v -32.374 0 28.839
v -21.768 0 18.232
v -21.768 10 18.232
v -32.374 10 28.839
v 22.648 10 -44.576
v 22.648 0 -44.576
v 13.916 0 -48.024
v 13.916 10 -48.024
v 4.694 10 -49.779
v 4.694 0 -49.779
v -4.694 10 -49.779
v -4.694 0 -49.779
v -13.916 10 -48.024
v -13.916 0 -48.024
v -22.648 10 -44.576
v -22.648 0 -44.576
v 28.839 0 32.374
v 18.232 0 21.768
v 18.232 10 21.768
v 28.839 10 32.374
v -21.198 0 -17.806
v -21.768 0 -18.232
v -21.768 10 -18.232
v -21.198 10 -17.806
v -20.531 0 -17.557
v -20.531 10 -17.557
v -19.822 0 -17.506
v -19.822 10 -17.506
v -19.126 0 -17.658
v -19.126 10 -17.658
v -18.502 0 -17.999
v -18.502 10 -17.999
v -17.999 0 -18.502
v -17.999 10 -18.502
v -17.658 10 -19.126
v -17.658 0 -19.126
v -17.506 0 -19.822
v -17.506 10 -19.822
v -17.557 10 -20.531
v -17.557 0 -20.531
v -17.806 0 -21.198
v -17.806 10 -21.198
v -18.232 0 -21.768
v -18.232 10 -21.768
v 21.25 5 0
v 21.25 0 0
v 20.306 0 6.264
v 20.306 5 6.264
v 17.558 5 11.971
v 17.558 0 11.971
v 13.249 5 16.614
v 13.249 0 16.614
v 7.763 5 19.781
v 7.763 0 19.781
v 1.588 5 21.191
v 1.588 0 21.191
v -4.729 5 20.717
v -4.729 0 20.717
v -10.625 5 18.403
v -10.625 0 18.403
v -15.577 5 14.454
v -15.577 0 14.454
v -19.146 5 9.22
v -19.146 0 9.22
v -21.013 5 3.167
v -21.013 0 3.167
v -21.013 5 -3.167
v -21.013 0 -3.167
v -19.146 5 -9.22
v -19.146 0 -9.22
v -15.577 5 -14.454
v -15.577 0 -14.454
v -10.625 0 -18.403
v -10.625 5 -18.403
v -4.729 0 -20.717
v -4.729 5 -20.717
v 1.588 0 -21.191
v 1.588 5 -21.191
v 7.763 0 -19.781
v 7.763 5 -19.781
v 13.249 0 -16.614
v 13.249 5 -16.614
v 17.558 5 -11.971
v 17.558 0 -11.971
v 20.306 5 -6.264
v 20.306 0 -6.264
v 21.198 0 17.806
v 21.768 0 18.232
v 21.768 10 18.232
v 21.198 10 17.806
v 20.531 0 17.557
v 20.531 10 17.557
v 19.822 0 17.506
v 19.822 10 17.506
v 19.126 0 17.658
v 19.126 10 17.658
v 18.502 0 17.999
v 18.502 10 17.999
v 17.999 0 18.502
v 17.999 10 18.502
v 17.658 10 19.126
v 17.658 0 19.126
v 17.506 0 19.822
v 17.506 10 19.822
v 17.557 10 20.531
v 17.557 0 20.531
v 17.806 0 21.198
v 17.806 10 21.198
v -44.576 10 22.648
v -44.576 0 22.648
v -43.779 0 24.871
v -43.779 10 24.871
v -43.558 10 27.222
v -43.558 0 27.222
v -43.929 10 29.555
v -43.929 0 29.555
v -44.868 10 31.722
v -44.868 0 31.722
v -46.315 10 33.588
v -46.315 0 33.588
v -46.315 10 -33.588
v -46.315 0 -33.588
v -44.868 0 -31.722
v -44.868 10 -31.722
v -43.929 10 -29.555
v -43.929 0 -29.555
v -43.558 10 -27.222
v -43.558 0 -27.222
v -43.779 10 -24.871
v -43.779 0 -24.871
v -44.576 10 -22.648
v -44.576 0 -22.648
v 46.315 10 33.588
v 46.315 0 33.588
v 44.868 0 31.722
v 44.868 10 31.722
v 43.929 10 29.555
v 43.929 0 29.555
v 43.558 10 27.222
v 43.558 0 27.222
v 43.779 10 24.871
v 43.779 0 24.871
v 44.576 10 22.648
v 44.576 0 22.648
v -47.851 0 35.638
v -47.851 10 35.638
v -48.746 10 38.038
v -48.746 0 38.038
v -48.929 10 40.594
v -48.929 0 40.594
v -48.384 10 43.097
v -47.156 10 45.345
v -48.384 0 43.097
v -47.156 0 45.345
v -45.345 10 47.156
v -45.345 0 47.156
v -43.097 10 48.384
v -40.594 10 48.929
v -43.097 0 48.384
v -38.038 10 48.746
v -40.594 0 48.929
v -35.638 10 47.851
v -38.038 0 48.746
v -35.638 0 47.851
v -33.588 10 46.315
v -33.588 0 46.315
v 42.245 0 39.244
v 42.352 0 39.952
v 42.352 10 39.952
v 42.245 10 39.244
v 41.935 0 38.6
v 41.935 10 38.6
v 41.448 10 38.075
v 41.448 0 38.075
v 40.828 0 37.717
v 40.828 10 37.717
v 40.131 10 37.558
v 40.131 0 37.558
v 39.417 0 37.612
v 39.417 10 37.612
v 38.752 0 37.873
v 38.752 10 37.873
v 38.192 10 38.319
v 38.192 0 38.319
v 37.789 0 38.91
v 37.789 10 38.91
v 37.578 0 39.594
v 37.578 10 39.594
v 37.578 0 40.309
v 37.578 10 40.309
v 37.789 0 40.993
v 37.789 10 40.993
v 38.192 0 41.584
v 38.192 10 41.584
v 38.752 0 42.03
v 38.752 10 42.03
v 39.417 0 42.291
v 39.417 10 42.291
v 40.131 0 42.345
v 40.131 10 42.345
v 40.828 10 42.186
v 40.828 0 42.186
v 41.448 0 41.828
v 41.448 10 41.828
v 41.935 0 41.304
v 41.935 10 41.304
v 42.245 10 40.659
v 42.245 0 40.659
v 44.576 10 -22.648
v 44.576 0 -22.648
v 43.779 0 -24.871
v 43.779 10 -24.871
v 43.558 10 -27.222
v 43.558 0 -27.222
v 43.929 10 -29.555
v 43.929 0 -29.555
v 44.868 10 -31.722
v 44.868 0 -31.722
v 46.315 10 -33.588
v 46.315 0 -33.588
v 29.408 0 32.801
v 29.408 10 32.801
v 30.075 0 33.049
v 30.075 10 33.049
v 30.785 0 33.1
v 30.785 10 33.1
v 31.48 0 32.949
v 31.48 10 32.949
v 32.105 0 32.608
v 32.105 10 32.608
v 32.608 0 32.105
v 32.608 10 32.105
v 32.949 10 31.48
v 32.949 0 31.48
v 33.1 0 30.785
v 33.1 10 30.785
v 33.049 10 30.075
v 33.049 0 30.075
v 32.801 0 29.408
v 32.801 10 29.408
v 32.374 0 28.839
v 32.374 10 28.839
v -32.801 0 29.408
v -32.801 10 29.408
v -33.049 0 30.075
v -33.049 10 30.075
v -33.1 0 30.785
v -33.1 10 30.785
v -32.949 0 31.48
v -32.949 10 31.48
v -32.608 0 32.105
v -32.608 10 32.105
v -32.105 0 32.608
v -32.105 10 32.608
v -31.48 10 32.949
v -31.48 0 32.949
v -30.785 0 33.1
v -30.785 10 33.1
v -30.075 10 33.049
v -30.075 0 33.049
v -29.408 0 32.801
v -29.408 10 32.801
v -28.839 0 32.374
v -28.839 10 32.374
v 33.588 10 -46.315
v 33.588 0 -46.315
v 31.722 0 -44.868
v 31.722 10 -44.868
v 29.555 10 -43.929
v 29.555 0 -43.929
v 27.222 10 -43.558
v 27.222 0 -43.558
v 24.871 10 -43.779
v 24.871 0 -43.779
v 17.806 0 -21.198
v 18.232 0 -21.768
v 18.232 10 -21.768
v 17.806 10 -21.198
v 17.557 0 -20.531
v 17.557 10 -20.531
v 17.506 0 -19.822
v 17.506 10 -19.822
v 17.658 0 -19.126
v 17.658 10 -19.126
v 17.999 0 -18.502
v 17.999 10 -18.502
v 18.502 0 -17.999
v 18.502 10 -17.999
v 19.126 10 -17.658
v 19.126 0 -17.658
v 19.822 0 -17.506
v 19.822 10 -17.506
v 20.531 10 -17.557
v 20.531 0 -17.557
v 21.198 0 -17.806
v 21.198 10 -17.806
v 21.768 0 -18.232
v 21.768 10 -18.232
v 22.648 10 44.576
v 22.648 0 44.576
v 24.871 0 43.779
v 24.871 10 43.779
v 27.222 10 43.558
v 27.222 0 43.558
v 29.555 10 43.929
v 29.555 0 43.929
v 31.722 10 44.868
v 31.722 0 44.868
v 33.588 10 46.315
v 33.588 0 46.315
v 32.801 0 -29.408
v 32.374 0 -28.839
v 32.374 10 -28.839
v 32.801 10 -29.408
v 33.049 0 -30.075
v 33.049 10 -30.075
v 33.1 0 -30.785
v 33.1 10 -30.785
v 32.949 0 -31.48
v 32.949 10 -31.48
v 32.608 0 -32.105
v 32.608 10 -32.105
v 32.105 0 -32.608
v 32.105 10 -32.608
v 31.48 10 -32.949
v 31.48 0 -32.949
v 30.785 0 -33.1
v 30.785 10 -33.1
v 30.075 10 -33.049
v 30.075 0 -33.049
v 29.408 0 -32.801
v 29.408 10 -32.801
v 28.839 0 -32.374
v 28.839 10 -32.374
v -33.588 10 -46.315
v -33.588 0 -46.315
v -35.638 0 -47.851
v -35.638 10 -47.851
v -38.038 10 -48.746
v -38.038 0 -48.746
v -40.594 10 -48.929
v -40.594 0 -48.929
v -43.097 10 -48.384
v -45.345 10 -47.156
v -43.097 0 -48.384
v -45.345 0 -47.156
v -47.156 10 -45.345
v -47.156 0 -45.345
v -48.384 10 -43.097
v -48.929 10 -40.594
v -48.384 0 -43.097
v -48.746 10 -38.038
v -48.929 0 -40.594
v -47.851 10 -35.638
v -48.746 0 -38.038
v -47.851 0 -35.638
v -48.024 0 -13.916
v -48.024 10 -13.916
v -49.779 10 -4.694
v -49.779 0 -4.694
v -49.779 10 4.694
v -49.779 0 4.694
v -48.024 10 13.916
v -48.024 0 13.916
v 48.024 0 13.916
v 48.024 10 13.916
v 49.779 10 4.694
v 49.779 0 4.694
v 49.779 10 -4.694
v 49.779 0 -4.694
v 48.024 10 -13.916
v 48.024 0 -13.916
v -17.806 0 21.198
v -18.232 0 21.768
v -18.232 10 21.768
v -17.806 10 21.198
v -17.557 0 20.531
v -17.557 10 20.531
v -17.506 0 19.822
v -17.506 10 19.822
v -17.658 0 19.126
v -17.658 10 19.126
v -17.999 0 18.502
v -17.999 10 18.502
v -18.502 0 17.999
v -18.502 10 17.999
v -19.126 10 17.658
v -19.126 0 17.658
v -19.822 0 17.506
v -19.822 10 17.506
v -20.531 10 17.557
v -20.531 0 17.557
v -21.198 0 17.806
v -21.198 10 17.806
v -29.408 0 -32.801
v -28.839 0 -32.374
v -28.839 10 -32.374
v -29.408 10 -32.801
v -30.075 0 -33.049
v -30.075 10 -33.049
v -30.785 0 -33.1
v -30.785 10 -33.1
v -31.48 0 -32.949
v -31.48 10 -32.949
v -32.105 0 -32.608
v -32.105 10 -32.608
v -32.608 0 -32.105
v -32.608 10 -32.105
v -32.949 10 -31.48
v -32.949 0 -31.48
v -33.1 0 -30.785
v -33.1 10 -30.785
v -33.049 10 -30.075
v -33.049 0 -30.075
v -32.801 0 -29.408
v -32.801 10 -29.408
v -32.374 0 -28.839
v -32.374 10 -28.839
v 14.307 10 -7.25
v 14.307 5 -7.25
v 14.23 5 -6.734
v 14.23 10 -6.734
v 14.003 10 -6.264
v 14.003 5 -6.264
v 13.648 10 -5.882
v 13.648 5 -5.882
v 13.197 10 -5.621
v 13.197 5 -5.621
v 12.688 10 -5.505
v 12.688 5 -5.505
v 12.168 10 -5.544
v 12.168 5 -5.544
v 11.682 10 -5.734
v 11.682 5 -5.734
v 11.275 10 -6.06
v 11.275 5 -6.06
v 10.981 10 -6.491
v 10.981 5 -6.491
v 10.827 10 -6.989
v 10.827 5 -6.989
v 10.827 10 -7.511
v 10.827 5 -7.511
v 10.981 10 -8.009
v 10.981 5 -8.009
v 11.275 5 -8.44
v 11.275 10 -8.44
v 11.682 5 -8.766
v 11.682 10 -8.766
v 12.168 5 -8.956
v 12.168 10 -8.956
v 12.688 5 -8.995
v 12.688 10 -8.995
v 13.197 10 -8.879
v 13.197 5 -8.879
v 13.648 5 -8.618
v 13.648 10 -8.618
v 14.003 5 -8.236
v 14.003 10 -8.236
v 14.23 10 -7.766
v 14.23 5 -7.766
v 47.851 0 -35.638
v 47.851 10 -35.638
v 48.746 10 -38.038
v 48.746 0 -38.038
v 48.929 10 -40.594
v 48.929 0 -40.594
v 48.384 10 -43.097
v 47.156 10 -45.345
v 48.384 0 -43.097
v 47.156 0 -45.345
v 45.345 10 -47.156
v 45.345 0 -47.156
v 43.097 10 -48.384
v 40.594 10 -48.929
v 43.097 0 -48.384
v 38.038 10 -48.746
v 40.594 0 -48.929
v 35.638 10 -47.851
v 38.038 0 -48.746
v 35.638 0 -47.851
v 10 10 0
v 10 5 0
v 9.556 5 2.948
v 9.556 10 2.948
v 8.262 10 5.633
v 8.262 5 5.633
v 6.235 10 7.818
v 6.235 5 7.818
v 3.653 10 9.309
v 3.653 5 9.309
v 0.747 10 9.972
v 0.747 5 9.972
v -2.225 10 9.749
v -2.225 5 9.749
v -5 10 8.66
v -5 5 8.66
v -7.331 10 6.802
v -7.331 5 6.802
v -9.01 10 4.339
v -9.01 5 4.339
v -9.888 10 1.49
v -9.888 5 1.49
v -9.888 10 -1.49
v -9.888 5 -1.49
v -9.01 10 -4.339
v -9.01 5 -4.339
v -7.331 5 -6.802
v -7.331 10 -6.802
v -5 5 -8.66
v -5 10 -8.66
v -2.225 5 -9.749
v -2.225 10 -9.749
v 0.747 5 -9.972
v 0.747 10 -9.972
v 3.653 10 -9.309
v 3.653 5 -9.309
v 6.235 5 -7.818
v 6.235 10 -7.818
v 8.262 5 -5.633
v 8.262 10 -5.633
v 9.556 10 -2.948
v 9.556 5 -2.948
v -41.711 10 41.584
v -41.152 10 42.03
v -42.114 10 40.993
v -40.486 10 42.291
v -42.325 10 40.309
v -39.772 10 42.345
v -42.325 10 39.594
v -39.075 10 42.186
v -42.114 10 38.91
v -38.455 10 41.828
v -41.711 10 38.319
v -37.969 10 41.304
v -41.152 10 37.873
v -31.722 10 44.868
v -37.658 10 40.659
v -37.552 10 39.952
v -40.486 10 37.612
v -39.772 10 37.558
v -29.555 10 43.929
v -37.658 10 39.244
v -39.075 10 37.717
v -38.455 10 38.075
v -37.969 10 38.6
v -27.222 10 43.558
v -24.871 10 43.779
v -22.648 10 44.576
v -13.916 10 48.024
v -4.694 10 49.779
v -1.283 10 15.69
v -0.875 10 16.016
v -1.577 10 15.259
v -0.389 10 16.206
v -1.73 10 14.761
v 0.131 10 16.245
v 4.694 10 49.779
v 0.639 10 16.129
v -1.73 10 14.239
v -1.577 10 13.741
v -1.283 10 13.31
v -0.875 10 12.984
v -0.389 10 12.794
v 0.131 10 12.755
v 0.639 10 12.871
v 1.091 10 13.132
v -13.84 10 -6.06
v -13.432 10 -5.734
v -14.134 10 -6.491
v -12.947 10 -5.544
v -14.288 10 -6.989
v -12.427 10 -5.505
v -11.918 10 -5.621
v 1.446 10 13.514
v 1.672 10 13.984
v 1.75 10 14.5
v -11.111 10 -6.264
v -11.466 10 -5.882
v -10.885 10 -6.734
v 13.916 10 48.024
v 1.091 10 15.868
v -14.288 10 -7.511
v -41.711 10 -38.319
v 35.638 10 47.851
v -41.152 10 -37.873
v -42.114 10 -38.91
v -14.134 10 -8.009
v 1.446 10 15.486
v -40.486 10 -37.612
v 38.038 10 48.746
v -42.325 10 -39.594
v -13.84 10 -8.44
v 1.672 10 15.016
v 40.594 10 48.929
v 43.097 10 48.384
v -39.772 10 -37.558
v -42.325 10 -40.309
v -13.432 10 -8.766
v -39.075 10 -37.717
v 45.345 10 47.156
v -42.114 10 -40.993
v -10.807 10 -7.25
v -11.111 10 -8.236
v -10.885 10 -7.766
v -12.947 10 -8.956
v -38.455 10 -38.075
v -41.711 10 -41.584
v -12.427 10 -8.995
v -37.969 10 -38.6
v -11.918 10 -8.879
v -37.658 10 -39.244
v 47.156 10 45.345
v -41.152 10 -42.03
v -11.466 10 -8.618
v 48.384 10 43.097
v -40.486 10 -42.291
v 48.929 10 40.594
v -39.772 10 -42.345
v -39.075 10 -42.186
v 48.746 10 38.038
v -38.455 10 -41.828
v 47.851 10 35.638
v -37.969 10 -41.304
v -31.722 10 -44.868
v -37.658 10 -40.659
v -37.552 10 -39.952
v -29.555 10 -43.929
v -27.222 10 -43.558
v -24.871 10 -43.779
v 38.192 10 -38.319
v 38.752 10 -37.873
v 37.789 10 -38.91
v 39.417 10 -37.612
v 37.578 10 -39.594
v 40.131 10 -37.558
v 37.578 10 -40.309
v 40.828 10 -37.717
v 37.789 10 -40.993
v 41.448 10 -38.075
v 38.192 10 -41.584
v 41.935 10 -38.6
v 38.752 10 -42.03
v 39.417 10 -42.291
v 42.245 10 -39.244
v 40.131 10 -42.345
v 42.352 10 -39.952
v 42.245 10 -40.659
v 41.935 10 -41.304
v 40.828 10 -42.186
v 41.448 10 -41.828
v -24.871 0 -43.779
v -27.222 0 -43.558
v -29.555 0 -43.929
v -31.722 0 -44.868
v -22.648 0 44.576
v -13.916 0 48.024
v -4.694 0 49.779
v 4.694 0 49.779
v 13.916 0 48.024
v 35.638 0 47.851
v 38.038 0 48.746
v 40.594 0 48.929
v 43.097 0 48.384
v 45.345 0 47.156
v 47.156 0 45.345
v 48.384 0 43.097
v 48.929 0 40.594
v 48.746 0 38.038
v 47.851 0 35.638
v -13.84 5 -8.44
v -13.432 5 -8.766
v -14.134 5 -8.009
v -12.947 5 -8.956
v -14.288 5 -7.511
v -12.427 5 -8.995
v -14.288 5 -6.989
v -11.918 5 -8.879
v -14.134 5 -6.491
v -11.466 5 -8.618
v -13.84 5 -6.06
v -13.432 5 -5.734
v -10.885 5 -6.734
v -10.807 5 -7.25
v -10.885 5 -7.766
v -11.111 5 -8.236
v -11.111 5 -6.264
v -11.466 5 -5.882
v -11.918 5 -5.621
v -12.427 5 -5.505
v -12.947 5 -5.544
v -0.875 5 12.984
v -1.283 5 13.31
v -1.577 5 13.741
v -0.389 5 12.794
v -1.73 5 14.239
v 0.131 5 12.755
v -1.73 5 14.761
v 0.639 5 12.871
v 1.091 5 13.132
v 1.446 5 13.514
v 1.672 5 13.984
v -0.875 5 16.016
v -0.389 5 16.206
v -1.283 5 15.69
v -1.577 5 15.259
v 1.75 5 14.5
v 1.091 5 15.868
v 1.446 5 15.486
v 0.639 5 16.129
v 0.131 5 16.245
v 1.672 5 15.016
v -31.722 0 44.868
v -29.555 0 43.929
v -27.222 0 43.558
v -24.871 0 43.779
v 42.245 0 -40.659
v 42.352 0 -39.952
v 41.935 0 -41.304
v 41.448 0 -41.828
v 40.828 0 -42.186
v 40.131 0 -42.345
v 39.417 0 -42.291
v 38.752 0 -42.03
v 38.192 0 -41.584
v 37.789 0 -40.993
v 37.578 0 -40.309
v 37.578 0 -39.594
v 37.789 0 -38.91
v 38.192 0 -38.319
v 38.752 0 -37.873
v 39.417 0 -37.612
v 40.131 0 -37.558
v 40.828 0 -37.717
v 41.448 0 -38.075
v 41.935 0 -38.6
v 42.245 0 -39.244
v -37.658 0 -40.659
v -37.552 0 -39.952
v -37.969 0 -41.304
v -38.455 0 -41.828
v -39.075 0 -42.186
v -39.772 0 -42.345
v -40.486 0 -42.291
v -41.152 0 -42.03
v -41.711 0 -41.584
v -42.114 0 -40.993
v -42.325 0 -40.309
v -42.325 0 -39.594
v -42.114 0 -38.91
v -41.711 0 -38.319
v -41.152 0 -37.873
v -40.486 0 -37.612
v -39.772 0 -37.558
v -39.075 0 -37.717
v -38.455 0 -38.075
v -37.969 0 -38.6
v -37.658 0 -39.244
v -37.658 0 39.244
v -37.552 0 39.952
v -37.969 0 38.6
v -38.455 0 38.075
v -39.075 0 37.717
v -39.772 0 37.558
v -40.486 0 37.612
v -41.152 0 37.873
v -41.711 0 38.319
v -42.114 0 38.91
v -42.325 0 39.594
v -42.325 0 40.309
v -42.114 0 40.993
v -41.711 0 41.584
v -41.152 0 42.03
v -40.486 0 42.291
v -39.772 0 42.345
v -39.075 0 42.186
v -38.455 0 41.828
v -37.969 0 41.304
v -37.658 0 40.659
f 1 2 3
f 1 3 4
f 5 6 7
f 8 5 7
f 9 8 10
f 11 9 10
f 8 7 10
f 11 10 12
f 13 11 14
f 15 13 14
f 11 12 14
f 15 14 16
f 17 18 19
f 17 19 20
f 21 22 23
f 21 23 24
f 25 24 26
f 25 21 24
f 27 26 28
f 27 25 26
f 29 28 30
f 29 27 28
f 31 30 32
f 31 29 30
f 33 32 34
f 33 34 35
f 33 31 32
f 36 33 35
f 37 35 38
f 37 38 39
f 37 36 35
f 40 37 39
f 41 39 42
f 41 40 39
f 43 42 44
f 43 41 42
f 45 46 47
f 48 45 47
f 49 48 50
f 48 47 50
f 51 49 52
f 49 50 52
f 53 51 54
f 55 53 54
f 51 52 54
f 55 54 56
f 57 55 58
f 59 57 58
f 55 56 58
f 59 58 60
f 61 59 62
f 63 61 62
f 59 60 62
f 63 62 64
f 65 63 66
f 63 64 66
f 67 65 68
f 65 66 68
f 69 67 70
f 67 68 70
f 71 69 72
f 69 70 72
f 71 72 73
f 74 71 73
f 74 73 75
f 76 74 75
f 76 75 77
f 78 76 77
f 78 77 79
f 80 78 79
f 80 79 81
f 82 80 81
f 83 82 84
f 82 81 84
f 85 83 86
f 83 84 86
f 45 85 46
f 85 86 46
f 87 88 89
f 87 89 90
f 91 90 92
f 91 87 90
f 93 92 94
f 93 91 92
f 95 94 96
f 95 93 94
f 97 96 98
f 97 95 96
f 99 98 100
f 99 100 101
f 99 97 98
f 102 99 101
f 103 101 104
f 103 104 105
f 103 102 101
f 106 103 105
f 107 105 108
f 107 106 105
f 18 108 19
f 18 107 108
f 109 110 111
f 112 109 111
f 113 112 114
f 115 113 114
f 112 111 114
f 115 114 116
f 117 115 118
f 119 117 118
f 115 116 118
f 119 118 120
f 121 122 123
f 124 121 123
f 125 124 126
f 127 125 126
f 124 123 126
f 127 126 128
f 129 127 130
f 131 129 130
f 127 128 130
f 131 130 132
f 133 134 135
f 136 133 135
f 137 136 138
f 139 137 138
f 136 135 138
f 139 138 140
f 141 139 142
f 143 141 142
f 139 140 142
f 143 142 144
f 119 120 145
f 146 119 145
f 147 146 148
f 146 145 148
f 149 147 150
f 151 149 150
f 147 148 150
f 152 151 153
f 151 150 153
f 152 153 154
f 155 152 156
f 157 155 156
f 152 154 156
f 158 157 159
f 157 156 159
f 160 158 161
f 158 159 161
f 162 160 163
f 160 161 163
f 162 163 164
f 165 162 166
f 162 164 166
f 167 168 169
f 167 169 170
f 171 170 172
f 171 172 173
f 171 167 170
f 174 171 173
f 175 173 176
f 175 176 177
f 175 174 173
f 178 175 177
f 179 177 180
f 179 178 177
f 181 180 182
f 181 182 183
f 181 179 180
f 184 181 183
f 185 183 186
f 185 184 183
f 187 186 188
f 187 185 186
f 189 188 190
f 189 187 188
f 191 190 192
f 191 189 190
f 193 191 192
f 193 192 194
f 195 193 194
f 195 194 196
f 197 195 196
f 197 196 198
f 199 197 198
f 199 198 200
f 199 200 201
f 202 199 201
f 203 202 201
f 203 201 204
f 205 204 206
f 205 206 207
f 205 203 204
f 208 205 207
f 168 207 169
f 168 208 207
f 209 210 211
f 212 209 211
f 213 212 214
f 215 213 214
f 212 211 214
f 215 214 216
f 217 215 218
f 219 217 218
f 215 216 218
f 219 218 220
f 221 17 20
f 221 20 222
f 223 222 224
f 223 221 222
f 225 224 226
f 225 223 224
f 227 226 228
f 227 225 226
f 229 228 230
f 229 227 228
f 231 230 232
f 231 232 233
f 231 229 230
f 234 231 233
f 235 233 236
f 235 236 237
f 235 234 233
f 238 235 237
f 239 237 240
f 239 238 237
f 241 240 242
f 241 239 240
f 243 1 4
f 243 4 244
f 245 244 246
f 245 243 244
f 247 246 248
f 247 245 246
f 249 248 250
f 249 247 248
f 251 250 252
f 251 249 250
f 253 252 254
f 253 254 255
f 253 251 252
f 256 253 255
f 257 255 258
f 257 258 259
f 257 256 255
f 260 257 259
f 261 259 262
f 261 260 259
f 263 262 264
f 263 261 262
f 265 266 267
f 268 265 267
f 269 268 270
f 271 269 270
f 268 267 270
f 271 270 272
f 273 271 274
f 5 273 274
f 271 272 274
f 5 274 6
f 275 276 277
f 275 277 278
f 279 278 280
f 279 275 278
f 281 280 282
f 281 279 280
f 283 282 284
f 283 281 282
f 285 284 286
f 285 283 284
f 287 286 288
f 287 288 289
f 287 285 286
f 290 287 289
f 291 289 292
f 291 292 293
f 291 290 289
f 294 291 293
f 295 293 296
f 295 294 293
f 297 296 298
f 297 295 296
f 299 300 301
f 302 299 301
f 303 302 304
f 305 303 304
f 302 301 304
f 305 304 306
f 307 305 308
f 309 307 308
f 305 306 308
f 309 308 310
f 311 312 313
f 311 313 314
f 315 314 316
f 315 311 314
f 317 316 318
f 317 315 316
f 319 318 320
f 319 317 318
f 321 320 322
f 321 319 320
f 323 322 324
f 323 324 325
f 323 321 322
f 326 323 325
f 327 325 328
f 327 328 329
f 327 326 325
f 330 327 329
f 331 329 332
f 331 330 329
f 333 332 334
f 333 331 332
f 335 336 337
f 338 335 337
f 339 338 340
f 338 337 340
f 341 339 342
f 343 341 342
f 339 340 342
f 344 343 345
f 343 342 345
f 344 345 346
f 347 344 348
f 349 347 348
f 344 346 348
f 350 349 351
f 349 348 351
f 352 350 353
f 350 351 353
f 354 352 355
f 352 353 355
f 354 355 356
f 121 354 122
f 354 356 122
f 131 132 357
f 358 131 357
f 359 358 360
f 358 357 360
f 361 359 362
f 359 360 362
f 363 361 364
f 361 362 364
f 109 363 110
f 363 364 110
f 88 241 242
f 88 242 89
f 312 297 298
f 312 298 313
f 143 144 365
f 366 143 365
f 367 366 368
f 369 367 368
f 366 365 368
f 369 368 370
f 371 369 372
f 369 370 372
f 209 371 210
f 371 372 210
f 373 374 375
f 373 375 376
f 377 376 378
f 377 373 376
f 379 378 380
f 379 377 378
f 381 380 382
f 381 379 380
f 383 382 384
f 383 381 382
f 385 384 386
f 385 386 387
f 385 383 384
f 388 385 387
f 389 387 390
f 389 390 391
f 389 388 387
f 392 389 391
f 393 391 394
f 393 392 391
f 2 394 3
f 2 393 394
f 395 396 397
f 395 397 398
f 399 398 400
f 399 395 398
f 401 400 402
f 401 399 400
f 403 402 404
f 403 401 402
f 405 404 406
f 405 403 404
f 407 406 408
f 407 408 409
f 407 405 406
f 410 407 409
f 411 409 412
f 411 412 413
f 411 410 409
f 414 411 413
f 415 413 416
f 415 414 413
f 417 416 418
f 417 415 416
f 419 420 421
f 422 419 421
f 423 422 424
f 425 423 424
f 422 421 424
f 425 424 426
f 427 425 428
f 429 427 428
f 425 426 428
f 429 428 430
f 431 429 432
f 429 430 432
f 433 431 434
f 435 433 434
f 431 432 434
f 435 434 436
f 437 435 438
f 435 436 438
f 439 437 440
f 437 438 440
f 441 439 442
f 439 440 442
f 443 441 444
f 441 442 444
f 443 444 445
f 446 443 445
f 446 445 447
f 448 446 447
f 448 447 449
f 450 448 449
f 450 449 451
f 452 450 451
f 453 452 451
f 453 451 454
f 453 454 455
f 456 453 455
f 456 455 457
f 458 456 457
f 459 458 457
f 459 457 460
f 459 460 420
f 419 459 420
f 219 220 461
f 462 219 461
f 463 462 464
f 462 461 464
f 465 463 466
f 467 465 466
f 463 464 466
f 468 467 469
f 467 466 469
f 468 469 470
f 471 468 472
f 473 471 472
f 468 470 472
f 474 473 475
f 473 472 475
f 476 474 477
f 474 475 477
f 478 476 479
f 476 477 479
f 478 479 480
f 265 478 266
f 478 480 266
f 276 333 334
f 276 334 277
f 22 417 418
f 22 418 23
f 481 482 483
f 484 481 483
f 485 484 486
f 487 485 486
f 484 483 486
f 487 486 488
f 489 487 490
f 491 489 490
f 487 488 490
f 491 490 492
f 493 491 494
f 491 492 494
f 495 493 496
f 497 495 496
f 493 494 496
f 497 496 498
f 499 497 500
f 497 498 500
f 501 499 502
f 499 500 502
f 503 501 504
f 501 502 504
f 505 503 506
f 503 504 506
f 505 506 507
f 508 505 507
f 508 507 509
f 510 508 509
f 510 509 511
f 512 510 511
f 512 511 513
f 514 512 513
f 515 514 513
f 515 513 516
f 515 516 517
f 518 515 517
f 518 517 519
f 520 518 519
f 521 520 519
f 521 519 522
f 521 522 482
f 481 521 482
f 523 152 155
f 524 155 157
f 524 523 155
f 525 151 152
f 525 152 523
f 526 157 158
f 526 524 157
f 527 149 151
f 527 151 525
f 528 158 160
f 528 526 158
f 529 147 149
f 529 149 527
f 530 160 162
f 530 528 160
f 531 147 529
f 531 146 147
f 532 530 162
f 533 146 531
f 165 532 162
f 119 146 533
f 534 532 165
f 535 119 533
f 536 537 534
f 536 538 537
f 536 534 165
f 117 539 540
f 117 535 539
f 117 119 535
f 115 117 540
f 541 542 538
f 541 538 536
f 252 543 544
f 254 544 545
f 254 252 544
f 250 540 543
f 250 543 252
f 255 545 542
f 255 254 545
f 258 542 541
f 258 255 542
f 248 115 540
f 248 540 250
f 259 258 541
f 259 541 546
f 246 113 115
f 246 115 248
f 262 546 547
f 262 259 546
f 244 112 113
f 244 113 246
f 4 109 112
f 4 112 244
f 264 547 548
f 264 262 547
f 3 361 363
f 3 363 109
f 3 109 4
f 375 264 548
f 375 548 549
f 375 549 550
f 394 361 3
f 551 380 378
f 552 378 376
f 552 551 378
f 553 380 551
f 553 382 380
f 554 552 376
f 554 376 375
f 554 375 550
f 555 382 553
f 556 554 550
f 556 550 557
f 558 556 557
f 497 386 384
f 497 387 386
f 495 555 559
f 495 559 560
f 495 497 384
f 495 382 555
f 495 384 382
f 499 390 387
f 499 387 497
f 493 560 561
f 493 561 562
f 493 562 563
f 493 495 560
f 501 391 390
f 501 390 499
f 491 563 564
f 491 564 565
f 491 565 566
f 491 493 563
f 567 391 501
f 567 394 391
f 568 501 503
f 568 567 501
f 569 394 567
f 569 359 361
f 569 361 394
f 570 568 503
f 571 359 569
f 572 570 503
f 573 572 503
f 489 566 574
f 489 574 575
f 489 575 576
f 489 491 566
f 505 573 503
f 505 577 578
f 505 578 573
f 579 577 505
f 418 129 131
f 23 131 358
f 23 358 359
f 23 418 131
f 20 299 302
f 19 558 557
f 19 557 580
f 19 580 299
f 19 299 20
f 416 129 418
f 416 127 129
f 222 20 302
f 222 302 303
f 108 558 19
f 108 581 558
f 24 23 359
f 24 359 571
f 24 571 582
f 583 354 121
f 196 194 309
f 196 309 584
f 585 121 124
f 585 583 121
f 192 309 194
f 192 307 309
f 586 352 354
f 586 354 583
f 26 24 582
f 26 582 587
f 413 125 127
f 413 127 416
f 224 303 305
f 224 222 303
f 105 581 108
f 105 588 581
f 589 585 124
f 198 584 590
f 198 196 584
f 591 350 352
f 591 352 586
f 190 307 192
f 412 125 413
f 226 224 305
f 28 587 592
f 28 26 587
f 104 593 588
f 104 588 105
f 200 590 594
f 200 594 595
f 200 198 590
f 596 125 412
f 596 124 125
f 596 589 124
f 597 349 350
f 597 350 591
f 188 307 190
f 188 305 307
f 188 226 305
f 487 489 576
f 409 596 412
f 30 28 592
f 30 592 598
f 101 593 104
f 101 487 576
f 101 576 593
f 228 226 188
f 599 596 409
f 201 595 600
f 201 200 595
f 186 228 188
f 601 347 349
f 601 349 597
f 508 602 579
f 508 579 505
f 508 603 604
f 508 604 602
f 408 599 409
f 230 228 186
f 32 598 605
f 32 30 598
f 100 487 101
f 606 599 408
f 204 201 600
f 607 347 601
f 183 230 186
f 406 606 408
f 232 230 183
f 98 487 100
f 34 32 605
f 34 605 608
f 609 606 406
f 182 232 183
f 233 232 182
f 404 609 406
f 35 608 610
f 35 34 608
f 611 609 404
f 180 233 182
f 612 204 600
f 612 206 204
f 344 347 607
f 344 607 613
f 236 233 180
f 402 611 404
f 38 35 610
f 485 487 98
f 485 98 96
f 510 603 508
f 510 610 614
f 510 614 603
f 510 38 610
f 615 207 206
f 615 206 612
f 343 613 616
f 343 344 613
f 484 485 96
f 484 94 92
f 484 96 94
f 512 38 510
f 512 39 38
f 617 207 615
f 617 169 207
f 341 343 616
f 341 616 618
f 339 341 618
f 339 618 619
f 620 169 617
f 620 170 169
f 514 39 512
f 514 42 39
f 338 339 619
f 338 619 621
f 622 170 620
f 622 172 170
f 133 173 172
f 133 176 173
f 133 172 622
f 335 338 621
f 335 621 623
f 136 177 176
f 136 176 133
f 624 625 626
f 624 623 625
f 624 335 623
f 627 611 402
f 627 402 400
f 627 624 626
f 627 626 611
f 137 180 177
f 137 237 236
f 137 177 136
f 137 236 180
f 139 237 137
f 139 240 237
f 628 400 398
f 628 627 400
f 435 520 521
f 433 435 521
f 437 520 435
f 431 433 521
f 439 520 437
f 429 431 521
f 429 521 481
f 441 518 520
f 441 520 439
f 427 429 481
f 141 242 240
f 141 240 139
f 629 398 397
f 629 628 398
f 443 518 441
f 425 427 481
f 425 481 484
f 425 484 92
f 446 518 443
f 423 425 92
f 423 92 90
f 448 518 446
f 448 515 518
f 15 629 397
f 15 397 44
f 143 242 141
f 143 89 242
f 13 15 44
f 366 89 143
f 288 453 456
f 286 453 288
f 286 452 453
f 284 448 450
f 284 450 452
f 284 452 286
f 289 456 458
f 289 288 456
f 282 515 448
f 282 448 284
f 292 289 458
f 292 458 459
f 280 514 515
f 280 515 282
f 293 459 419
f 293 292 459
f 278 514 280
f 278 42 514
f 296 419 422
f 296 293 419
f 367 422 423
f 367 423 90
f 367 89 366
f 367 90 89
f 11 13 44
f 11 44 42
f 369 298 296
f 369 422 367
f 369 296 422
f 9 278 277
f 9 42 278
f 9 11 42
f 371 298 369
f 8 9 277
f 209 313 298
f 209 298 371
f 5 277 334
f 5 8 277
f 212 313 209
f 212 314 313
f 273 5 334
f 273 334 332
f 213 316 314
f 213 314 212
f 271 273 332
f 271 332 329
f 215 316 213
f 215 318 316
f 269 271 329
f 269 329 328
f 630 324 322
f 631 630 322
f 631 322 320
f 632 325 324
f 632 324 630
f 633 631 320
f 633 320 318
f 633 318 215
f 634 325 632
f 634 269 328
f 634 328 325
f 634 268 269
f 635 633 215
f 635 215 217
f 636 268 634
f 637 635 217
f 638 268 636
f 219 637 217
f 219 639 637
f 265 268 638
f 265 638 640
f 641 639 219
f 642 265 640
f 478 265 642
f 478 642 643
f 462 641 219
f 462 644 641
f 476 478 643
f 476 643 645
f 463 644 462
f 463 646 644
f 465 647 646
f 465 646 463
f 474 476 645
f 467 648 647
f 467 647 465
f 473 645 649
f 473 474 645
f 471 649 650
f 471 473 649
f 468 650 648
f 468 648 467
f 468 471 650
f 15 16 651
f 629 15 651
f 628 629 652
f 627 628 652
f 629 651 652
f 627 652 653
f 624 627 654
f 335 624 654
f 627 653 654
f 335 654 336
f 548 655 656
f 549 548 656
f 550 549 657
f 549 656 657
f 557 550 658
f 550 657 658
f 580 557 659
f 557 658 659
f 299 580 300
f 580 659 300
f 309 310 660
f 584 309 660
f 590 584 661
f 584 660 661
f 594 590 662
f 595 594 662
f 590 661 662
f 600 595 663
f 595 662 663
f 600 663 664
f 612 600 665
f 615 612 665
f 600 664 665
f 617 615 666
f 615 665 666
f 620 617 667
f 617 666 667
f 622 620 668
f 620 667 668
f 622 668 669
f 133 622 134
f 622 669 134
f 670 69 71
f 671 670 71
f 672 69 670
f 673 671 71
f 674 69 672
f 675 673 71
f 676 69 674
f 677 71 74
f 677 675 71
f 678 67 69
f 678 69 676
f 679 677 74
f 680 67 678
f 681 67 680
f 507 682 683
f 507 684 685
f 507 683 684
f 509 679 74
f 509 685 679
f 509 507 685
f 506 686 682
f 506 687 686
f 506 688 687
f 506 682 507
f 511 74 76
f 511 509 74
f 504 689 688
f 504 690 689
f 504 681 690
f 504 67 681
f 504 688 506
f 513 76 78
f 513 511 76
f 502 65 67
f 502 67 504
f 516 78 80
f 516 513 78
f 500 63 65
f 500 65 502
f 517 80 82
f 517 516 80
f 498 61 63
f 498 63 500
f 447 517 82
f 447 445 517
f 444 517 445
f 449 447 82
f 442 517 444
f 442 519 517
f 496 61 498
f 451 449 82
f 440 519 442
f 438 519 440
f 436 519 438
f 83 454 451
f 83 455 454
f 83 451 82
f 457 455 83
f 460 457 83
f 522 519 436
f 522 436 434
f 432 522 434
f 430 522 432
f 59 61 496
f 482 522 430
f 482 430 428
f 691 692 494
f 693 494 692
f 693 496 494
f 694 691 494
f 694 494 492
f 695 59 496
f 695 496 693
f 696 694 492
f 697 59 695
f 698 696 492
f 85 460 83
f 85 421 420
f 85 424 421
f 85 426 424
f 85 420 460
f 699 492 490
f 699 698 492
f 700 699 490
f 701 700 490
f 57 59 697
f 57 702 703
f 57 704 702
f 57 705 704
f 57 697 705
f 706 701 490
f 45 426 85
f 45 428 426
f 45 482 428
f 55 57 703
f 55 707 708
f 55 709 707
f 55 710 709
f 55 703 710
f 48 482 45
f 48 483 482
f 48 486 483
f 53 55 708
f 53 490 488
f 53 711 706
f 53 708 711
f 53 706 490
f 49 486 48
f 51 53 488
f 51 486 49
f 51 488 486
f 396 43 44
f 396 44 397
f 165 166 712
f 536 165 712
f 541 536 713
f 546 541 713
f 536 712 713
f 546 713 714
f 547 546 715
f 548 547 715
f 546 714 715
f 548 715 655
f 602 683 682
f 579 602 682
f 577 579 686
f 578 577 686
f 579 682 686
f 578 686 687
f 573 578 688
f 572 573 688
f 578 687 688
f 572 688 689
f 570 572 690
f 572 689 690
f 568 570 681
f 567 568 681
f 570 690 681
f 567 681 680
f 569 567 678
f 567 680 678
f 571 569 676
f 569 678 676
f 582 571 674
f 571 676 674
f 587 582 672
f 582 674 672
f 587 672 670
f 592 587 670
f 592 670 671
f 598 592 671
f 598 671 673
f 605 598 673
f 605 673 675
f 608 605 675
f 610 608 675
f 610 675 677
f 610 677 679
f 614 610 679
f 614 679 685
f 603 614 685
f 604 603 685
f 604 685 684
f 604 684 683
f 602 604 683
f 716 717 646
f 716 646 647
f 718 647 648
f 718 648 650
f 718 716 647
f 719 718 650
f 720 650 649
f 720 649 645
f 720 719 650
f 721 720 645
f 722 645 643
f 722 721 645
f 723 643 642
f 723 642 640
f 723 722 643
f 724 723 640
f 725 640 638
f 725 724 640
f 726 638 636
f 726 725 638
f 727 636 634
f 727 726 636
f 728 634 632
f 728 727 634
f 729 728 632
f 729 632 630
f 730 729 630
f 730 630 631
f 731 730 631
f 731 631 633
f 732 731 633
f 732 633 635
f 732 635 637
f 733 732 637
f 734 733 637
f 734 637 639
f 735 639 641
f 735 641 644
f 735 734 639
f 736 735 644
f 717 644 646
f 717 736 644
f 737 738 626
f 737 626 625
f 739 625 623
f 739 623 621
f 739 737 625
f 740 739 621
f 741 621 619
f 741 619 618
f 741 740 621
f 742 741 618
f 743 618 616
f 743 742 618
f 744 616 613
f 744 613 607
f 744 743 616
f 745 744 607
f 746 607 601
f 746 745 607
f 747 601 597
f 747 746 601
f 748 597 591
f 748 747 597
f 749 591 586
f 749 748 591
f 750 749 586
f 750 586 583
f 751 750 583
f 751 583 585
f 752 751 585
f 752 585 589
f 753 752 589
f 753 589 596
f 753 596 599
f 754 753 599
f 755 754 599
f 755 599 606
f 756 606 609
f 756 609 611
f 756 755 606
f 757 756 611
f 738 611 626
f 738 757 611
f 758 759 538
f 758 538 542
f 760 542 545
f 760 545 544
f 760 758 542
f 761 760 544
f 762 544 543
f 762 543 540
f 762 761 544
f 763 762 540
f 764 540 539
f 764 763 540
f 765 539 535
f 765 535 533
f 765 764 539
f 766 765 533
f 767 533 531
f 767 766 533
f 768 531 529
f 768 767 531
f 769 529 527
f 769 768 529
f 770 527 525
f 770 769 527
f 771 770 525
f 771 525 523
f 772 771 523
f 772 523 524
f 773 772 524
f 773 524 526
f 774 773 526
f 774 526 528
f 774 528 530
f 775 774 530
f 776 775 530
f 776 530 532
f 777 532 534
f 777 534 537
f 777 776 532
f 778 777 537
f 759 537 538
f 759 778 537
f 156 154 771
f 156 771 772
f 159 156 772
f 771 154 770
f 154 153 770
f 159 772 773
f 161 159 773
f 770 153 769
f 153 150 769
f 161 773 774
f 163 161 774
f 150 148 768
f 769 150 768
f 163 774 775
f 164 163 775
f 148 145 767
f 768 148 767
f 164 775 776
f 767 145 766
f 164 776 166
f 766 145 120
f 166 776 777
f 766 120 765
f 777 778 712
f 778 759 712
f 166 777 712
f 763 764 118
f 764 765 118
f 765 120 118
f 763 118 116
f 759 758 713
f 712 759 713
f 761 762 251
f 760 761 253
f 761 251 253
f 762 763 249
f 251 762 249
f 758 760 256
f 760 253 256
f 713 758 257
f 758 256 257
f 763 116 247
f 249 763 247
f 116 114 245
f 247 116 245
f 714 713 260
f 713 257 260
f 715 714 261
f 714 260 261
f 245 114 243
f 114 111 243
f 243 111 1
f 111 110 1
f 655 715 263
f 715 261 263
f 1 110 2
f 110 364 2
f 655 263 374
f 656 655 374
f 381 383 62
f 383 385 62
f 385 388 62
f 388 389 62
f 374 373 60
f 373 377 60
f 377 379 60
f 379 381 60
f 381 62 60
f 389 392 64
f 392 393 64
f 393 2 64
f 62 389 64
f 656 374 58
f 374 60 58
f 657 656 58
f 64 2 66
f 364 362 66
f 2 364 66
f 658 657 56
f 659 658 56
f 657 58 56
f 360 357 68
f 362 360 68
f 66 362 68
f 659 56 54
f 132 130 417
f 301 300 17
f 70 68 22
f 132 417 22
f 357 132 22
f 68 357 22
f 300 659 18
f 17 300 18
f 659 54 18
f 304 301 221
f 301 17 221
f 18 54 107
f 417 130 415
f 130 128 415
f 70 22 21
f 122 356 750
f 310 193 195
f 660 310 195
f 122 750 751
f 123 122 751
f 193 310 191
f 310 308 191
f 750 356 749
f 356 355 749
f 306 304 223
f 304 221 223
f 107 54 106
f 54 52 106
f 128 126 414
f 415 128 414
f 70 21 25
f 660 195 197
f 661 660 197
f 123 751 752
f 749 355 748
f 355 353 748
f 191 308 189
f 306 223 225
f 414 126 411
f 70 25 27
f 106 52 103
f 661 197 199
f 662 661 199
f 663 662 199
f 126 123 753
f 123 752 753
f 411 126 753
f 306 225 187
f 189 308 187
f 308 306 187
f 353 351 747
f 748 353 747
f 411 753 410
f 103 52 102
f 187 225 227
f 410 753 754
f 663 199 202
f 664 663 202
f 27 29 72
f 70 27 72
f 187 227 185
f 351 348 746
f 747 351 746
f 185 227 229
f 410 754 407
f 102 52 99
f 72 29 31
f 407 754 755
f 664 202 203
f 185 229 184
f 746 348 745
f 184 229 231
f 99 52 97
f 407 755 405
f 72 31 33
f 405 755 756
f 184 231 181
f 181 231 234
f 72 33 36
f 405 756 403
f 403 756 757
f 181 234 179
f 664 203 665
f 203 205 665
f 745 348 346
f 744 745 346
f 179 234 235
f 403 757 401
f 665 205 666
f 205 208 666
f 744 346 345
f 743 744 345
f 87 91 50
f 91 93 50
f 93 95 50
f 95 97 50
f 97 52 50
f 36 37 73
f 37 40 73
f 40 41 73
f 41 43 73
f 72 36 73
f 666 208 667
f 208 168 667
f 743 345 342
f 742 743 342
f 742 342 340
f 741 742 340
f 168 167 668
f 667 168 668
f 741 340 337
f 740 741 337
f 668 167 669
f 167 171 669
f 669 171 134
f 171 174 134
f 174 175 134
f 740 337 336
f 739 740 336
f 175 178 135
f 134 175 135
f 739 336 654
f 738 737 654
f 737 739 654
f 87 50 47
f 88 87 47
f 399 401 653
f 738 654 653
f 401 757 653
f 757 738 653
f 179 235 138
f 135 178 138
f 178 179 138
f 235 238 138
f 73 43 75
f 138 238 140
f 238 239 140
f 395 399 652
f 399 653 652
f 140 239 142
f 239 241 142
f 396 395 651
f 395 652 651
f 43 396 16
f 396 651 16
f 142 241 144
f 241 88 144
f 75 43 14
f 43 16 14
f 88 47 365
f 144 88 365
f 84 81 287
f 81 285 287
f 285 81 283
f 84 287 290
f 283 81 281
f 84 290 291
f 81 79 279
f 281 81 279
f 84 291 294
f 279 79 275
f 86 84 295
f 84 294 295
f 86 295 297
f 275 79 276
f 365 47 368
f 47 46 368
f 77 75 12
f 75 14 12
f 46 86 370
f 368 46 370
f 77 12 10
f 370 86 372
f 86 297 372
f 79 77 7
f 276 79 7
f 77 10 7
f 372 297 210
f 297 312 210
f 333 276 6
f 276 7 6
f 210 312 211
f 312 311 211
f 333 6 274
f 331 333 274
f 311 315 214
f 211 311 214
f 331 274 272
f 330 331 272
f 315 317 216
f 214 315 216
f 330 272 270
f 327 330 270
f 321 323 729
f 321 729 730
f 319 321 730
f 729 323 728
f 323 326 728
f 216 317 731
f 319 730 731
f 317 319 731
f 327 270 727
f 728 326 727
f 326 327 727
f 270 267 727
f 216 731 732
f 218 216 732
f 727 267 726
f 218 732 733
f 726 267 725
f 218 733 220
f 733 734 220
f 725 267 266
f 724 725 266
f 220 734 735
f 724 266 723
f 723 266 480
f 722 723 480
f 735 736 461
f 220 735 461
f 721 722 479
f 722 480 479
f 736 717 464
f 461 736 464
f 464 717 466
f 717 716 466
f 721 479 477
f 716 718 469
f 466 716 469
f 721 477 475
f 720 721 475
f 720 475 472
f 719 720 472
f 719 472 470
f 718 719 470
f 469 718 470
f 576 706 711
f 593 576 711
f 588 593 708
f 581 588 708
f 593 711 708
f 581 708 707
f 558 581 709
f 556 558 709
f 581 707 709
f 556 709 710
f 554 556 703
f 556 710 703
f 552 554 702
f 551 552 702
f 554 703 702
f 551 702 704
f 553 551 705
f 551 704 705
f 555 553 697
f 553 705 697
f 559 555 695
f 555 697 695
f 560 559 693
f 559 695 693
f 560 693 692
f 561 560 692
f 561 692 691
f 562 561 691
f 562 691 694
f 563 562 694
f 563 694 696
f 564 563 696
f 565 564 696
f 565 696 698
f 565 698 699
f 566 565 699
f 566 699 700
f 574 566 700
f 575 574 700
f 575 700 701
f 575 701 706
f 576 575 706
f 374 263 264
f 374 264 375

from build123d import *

# Parameters (mm, degrees)
SKETCH1_R           = 2.4
BOSS_EXTRUDE2_DEPTH = 10
SKETCH2_R           = 21.25
SKETCH2_R_2         = 1.75
SKETCH2_R_3         = 10
CUT_EXTRUDE3_DEPTH  = 5
SKETCH2_2_R         = 1.75
SKETCH2_2_R_2       = 10
CUT_EXTRUDE4_DEPTH  = 72.414284285


with BuildPart() as part:
    # Sketch1 → Boss-Extrude2 (new body)
    with BuildSketch(Plane(origin=(0, 0, 0), x_dir=(1, 0, 0), z_dir=(0, 1, 0))):
        with BuildLine():
            ThreePointArc((44.576420667, -22.648238795), (50, 0), (44.576420667, 22.648238795))
            ThreePointArc((44.576420667, 22.648238795), (43.670494672, 28.400158503), (46.315494168, 33.587572106))
            ThreePointArc((46.315494168, 33.587572106), (46.315494168, 46.315494168), (33.587572106, 46.315494168))
            ThreePointArc((33.587572106, 46.315494168), (28.400158503, 43.670494672), (22.648238795, 44.576420667))
            ThreePointArc((22.648238795, 44.576420667), (0, 50), (-22.648238795, 44.576420667))
            ThreePointArc((-22.648238795, 44.576420667), (-28.400158503, 43.670494672), (-33.587572106, 46.315494168))
            ThreePointArc((-33.587572106, 46.315494168), (-46.315494168, 46.315494168), (-46.315494168, 33.587572106))
            ThreePointArc((-46.315494168, 33.587572106), (-43.670494672, 28.400158503), (-44.576420667, 22.648238795))
            ThreePointArc((-44.576420667, 22.648238795), (-50, 0), (-44.576420667, -22.648238795))
            ThreePointArc((-44.576420667, -22.648238795), (-43.670494672, -28.400158503), (-46.315494168, -33.587572106))
            ThreePointArc((-46.315494168, -33.587572106), (-46.315494168, -46.315494168), (-33.587572106, -46.315494168))
            ThreePointArc((-33.587572106, -46.315494168), (-28.400158503, -43.670494672), (-22.648238795, -44.576420667))
            ThreePointArc((-22.648238795, -44.576420667), (0, -50), (22.648238795, -44.576420667))
            ThreePointArc((22.648238795, -44.576420667), (28.400158503, -43.670494672), (33.587572106, -46.315494168))
            ThreePointArc((33.587572106, -46.315494168), (46.315494168, -46.315494168), (46.315494168, -33.587572106))
            ThreePointArc((46.315494168, -33.587572106), (43.670494672, -28.400158503), (44.576420667, -22.648238795))
        make_face()
        with BuildLine():
            ThreePointArc((-21.767766953, -18.232233047), (-18.232233047, -18.232233047), (-18.232233047, -21.767766953))
            Line((-18.232233047, -21.767766953), (-28.838834765, -32.374368671))
            ThreePointArc((-28.838834765, -32.374368671), (-32.374368671, -32.374368671), (-32.374368671, -28.838834765))
            Line((-32.374368671, -28.838834765), (-21.767766953, -18.232233047))
        make_face(mode=Mode.SUBTRACT)
        with BuildLine():
            ThreePointArc((18.232233047, -21.767766953), (18.232233047, -18.232233047), (21.767766953, -18.232233047))
            Line((21.767766953, -18.232233047), (32.374368671, -28.838834765))
            ThreePointArc((32.374368671, -28.838834765), (32.374368671, -32.374368671), (28.838834765, -32.374368671))
            Line((28.838834765, -32.374368671), (18.232233047, -21.767766953))
        make_face(mode=Mode.SUBTRACT)
        with BuildLine():
            ThreePointArc((-18.232233047, 21.767766953), (-18.232233047, 18.232233047), (-21.767766953, 18.232233047))
            Line((-21.767766953, 18.232233047), (-32.374368671, 28.838834765))
            ThreePointArc((-32.374368671, 28.838834765), (-32.374368671, 32.374368671), (-28.838834765, 32.374368671))
            Line((-28.838834765, 32.374368671), (-18.232233047, 21.767766953))
        make_face(mode=Mode.SUBTRACT)
        with BuildLine():
            ThreePointArc((21.767766953, 18.232233047), (18.232233047, 18.232233047), (18.232233047, 21.767766953))
            Line((18.232233047, 21.767766953), (28.838834765, 32.374368671))
            ThreePointArc((28.838834765, 32.374368671), (32.374368671, 32.374368671), (32.374368671, 28.838834765))
            Line((32.374368671, 28.838834765), (21.767766953, 18.232233047))
        make_face(mode=Mode.SUBTRACT)
        with Locations((39.951533137, -39.951533137)):
            Circle(SKETCH1_R, mode=Mode.SUBTRACT)
        with Locations((-39.951533137, -39.951533137)):
            Circle(SKETCH1_R, mode=Mode.SUBTRACT)
        with Locations((-39.951533137, 39.951533137)):
            Circle(SKETCH1_R, mode=Mode.SUBTRACT)
        with Locations((39.951533137, 39.951533137)):
            Circle(SKETCH1_R, mode=Mode.SUBTRACT)
    extrude(amount=BOSS_EXTRUDE2_DEPTH)

    # Sketch2 → Cut-Extrude3 (cut)
    with BuildSketch(Plane.XZ):
        Circle(SKETCH2_R)
        with Locations((0, 14.5)):
            Circle(SKETCH2_R_2, mode=Mode.SUBTRACT)
        with Locations((12.557368355, -7.25)):
            Circle(SKETCH2_R_2, mode=Mode.SUBTRACT)
        with Locations((-12.557368355, -7.25)):
            Circle(SKETCH2_R_2, mode=Mode.SUBTRACT)
        Circle(SKETCH2_R_3, mode=Mode.SUBTRACT)
    extrude(amount=-CUT_EXTRUDE3_DEPTH, mode=Mode.SUBTRACT)

    # Sketch2<2> → Cut-Extrude4 (cut, through all)
    with BuildSketch(Plane.XZ):
        with Locations((0, 14.5)):
            Circle(SKETCH2_2_R)
        with Locations((12.557368355, -7.25)):
            Circle(SKETCH2_2_R)
        with Locations((-12.557368355, -7.25)):
            Circle(SKETCH2_2_R)
        Circle(SKETCH2_2_R_2)
    extrude(amount=-CUT_EXTRUDE4_DEPTH, mode=Mode.SUBTRACT)


solid = part.part
